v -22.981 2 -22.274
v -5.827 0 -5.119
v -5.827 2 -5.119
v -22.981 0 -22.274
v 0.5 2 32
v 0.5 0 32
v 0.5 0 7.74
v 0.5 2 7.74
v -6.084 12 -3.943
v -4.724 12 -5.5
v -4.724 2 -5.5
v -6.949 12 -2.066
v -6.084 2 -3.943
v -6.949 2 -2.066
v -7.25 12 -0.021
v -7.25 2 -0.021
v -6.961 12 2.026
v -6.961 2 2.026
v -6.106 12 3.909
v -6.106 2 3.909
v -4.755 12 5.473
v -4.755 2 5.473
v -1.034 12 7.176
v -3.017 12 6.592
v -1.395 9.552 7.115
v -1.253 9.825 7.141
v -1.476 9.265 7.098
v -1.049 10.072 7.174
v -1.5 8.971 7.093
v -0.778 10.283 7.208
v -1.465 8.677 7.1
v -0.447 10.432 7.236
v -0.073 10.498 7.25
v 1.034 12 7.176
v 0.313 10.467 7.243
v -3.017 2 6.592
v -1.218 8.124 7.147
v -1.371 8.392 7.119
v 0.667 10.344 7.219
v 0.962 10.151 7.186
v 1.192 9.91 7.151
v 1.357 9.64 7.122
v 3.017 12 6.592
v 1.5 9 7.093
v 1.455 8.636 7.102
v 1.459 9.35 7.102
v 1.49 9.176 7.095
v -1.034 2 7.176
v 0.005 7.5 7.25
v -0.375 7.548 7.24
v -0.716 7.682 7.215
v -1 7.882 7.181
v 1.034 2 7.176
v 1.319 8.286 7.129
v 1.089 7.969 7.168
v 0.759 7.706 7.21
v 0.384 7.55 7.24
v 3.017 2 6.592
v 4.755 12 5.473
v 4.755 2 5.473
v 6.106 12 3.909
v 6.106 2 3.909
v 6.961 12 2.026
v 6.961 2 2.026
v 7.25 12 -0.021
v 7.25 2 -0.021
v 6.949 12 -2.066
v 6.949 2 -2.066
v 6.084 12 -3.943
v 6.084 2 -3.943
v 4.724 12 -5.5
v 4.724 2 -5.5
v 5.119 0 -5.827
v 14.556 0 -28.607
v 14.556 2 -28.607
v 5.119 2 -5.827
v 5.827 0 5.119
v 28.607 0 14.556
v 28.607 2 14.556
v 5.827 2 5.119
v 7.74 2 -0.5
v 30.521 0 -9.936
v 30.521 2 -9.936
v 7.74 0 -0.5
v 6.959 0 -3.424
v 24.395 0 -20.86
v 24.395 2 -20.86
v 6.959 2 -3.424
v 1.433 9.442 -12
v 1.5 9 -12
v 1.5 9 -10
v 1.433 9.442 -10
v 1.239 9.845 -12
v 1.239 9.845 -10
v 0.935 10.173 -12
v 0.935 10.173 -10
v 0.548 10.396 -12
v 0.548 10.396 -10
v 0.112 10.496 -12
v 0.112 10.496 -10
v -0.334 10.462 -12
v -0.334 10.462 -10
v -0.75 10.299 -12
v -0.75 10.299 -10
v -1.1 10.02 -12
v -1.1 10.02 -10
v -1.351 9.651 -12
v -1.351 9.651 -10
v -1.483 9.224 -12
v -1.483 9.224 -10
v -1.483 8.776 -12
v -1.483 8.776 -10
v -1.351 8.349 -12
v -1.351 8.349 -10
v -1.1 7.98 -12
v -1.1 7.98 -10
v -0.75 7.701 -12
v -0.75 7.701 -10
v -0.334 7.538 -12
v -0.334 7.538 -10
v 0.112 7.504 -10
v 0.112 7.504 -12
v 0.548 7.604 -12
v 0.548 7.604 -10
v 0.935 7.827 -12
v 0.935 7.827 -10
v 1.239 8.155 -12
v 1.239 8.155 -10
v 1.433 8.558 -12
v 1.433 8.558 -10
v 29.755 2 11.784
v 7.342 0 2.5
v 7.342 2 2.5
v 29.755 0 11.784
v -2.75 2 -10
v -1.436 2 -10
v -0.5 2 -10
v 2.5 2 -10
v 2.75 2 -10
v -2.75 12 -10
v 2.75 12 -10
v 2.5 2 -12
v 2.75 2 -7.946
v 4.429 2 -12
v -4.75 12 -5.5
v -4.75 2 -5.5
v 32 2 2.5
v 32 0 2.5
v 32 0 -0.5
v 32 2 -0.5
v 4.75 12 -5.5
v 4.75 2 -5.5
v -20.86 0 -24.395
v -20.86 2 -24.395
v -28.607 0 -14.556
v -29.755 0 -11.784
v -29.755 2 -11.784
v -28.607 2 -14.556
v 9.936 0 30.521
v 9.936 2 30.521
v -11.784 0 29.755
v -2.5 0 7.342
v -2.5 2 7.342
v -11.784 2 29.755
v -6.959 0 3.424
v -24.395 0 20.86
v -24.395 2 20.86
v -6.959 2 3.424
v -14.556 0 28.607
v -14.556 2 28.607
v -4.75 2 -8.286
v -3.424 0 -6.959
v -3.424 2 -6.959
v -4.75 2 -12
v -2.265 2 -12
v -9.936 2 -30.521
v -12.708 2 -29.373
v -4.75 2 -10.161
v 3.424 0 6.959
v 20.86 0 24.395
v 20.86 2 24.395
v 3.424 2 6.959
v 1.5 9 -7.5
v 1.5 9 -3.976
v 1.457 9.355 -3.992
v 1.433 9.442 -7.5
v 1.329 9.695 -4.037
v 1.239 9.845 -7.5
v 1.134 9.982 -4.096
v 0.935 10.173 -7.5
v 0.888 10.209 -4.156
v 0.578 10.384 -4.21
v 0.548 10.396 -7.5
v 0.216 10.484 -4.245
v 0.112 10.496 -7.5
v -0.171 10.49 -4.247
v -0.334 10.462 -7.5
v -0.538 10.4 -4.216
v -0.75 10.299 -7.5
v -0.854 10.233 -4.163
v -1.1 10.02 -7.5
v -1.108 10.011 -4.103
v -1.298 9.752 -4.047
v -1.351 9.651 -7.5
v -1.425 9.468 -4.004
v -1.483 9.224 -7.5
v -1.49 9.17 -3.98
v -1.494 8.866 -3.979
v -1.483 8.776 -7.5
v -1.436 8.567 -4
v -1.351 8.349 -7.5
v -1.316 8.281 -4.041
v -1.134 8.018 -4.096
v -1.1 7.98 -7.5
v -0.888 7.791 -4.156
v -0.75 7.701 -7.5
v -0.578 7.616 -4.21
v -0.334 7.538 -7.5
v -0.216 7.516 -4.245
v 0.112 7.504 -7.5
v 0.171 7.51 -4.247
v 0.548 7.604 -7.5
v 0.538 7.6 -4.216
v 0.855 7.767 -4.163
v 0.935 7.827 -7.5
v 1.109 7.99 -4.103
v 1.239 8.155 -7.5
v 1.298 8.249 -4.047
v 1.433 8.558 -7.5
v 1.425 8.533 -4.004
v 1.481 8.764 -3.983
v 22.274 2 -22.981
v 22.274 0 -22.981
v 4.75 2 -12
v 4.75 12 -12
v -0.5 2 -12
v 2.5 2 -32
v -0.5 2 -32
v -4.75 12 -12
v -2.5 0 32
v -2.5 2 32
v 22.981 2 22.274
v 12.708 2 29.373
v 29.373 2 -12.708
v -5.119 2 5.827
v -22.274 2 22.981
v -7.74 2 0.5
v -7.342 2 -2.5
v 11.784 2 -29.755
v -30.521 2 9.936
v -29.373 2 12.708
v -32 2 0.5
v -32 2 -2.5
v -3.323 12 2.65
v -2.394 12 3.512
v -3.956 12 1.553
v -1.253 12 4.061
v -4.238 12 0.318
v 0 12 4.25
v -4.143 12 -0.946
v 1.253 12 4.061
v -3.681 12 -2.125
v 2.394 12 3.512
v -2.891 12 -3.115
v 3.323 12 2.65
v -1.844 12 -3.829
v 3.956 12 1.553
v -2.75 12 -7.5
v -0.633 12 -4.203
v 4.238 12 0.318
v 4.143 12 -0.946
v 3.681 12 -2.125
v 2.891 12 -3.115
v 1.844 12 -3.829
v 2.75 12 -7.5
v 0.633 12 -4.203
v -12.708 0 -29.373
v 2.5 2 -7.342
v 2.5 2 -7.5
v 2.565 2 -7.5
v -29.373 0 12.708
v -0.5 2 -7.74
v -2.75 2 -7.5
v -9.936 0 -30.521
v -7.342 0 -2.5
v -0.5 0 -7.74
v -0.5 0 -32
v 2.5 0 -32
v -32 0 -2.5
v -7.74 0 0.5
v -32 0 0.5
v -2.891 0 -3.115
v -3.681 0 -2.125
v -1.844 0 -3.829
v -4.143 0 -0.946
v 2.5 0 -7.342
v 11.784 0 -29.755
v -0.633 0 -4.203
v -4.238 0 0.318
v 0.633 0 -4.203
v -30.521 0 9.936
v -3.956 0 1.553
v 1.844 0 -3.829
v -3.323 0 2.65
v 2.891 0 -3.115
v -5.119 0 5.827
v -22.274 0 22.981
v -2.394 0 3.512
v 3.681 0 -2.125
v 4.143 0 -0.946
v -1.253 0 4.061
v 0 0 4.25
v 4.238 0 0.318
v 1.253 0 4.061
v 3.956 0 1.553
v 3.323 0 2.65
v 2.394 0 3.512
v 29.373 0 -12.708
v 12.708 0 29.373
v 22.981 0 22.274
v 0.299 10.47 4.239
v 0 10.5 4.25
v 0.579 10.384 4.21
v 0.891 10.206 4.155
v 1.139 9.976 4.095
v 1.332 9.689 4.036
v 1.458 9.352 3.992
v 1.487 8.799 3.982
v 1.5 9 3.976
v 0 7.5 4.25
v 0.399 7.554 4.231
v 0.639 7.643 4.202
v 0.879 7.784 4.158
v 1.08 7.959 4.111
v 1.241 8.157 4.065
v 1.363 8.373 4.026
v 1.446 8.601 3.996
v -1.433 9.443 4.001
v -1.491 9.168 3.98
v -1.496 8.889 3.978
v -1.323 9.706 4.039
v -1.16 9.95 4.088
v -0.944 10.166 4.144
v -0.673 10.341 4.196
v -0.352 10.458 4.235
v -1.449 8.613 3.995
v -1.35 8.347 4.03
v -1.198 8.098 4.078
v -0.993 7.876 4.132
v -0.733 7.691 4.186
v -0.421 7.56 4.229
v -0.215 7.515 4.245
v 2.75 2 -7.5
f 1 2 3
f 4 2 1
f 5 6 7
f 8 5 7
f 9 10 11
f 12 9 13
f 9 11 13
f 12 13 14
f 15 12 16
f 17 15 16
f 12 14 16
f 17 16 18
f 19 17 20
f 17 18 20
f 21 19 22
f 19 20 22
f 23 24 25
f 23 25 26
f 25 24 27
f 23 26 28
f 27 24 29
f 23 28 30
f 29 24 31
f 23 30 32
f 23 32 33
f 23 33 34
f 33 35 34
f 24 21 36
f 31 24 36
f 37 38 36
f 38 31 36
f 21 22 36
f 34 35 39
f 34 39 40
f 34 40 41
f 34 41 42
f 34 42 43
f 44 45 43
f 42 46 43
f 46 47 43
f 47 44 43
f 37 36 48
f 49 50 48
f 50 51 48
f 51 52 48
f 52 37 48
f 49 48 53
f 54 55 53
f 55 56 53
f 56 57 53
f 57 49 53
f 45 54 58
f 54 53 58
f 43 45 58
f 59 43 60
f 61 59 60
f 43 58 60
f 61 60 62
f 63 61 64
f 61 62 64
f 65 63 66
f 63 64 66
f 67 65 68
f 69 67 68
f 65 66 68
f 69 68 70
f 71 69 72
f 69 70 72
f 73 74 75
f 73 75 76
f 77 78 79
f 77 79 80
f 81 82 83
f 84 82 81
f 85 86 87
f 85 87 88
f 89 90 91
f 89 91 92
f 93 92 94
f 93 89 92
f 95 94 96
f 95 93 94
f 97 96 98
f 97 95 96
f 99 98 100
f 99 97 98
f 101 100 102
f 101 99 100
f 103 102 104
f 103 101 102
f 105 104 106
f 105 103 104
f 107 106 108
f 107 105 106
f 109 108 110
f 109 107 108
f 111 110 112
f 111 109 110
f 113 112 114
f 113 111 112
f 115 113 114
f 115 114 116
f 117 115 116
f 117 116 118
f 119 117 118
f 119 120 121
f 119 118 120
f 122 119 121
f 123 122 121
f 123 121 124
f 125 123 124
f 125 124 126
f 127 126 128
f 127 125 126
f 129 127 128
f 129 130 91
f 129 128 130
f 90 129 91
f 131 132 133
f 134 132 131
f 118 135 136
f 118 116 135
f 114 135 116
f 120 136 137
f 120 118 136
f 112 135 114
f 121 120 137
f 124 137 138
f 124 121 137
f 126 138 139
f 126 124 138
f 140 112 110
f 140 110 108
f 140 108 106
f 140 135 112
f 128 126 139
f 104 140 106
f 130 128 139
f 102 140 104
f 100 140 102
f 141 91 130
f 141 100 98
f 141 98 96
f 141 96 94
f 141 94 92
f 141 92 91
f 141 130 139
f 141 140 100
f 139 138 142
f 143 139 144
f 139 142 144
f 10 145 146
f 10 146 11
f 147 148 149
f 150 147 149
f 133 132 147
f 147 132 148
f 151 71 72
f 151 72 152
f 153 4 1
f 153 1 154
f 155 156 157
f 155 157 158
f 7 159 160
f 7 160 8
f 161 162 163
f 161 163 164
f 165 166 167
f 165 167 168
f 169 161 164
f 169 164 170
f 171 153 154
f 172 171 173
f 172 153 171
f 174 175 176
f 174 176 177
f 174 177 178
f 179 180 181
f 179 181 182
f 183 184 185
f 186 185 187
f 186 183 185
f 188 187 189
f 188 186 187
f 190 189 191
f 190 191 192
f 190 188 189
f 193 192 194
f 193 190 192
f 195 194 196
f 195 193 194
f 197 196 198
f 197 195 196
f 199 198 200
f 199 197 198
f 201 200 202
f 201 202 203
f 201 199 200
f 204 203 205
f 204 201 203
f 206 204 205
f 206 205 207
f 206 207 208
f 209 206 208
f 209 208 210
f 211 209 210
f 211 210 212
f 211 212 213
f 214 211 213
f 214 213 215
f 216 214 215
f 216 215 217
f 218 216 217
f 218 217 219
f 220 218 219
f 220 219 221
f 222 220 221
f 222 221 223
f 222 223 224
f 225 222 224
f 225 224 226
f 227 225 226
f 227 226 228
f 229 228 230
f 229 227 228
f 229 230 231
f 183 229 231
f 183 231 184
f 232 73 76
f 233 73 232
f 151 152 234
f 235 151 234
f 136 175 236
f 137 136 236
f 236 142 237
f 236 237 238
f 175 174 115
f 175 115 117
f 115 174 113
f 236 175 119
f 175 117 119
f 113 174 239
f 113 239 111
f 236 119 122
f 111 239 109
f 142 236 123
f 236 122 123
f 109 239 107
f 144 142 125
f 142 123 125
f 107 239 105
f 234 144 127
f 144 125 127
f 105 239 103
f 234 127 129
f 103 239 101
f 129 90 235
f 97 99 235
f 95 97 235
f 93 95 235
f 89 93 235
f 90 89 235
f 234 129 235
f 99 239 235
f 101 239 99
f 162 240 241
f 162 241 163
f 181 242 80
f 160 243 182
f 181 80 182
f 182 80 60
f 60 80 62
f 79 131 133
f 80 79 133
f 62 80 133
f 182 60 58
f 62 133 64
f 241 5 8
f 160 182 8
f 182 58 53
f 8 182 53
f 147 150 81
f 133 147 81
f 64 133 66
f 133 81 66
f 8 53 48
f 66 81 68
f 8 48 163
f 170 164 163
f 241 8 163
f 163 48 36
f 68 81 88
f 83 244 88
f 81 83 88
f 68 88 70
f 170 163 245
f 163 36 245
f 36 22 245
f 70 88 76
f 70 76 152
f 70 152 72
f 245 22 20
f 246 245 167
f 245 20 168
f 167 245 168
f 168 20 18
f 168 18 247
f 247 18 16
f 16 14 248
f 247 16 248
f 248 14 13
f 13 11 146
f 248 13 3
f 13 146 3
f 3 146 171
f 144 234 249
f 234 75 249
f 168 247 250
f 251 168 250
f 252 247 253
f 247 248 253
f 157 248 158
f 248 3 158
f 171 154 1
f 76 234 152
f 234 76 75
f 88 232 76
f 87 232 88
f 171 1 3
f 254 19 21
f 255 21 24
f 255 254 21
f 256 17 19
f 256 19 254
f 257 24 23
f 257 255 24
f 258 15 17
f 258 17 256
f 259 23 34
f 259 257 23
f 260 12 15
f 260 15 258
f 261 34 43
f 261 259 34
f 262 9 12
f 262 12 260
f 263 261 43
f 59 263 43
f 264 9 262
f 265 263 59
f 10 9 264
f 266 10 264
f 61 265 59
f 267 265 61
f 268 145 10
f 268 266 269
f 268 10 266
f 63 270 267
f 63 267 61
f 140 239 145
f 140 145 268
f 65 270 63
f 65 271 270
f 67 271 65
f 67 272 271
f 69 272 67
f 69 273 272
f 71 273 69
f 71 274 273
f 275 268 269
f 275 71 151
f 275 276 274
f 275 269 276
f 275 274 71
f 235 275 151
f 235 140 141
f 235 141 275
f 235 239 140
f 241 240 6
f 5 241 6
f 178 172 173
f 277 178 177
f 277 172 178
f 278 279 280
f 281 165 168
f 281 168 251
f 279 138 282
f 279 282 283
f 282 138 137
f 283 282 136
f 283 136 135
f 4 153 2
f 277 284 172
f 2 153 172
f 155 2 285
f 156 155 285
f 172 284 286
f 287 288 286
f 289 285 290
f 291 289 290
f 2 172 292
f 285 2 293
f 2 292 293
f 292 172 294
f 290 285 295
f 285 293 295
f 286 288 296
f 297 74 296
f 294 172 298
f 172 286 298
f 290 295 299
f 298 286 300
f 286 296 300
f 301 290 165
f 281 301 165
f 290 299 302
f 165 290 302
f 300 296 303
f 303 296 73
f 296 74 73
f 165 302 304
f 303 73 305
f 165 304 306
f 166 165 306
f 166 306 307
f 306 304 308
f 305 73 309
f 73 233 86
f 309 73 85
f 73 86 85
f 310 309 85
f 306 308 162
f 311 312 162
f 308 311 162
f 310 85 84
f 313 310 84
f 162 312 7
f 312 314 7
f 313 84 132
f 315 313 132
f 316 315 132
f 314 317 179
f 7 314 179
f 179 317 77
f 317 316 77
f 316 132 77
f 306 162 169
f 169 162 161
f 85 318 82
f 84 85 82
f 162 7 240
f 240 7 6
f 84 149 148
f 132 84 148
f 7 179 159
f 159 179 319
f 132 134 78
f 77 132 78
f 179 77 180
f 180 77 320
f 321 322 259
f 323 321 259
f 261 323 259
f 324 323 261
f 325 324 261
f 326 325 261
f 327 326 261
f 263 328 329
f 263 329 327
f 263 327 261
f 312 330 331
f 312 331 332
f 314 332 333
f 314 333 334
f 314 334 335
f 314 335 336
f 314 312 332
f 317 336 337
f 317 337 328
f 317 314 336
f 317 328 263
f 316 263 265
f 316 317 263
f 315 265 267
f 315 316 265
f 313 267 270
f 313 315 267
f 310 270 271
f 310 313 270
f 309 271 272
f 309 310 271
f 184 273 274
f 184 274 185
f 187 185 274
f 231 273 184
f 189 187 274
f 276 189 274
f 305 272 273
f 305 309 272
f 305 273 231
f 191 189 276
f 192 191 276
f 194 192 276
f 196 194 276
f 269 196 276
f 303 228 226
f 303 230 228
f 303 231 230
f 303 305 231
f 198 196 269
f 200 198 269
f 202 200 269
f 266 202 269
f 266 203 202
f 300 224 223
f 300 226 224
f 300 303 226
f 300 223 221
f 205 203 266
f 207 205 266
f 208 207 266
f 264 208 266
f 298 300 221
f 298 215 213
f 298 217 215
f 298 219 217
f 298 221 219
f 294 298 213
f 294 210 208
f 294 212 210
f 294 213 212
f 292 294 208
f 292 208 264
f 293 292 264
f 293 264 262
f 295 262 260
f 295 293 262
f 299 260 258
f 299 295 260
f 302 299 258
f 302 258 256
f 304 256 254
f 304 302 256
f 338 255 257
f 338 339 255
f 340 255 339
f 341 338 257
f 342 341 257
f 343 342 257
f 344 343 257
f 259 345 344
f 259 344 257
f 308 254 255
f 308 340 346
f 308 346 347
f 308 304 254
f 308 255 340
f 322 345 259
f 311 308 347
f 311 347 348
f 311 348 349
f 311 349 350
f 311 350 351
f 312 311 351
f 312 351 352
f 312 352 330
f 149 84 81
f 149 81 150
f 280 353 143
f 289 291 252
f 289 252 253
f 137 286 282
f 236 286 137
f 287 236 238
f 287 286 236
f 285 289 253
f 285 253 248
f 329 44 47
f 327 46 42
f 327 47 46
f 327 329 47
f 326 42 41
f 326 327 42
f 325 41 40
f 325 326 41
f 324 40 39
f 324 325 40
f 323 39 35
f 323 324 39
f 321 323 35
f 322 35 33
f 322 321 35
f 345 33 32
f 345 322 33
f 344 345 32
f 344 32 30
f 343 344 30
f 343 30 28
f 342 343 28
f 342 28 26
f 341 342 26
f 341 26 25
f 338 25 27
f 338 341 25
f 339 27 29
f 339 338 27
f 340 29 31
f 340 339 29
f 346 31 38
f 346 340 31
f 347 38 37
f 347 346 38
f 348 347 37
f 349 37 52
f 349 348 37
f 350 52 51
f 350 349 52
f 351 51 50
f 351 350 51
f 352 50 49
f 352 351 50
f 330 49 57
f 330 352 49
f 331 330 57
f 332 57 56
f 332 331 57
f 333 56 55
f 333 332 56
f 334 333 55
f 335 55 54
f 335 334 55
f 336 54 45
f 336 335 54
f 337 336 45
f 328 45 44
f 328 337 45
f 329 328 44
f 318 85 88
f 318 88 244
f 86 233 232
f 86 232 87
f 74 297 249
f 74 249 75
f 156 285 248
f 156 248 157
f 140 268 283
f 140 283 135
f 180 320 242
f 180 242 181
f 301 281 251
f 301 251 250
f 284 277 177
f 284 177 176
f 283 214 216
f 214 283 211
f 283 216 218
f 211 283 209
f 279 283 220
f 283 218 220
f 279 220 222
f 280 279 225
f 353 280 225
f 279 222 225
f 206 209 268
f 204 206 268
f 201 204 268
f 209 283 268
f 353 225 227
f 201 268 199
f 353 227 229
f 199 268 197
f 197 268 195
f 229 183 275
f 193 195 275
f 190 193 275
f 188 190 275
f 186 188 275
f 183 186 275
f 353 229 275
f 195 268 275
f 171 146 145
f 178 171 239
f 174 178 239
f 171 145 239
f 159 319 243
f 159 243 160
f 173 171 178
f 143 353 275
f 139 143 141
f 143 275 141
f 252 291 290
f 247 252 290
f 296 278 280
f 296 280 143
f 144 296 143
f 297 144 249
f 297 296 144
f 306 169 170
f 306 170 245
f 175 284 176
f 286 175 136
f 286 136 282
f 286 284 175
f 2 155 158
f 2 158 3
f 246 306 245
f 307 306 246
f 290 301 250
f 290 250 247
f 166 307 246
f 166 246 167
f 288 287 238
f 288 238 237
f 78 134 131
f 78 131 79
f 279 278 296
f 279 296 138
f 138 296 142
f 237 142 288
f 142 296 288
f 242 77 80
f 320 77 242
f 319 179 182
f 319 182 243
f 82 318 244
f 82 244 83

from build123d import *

# Parameters (mm, degrees)
SKETCH1_R               = 7.25
SKETCH1_R_2             = 4.25
SKETCH1_W               = 3
SKETCH1_H               = 32
SKETCH1_W_2             = 32
SKETCH1_H_2             = 3
BOSS_EXTRUDE1_DEPTH     = 2
SKETCH1_3_R             = 7.25
SKETCH1_3_R_2           = 4.25
BOSS_EXTRUDE2_DEPTH     = 12
SKETCH5_W               = 9.5
SKETCH5_H               = 6.5
SKETCH5_W_2             = 5.5
SKETCH5_H_2             = 2.5
BOSS_EXTRUDE3_DEPTH     = 10
CUT_EXTRUDE1_DEPTH      = 47.818799643
CUT_EXTRUDE1_DEPTH_BACK = 47.818799643
SKETCH2_R               = 1.5
CUT_EXTRUDE3_DEPTH      = 47.818799643
CUT_EXTRUDE3_DEPTH_BACK = 47.818799643
SKETCH3_R               = 4.25


with BuildPart() as part:
    # Sketch1 → Boss-Extrude1 (new body)
    # profile 1 of 17: a face of its own
    with BuildSketch(Plane(origin=(0, 0, 0), x_dir=(1, 0, 0), z_dir=(0, 1, 0))):
        Circle(SKETCH1_R)
        Circle(SKETCH1_R_2, mode=Mode.SUBTRACT)
    # profile 2 of 17: a face of its own
    with BuildSketch(Plane(origin=(0, 0, 0), x_dir=(1, 0, 0), z_dir=(0, 1, 0))):
        Polygon((-0.461939766, 0.191341716), (11.783930069, 29.755486757), (14.555568667, 28.607436459), (2.309698831, -0.956708581), align=None)
    # profile 3 of 17: a face of its own
    with BuildSketch(Plane(origin=(0, 0, 0), x_dir=(1, 0, 0), z_dir=(0, 1, 0))):
        with Locations((1, 16)):
            Rectangle(SKETCH1_W, SKETCH1_H)
    # profile 4 of 17: a face of its own
    with BuildSketch(Plane(origin=(0, 0, 0), x_dir=(1, 0, 0), z_dir=(0, 1, 0))):
        Polygon((-0.353553391, 0.353553391), (22.273863607, 22.980970389), (24.395183951, 20.859650045), (1.767766953, -1.767766953), align=None)
    # profile 5 of 17: a face of its own
    with BuildSketch(Plane(origin=(0, 0, 0), x_dir=(1, 0, 0), z_dir=(0, 1, 0))):
        Polygon((-0.191341716, 0.461939766), (29.372803324, 12.707809602), (30.520853621, 9.936171004), (0.956708581, -2.309698831), align=None)
    # profile 6 of 17: a face of its own
    with BuildSketch(Plane(origin=(0, 0, 0), x_dir=(1, 0, 0), z_dir=(0, 1, 0))):
        with Locations((16, -1)):
            Rectangle(SKETCH1_W_2, SKETCH1_H_2)
    # profile 7 of 17: a face of its own
    with BuildSketch(Plane(origin=(0, 0, 0), x_dir=(1, 0, 0), z_dir=(0, 1, 0))):
        Polygon((0.191341716, 0.461939766), (29.755486757, -11.783930069), (28.607436459, -14.555568667), (-0.956708581, -2.309698831), align=None)
    # profile 8 of 17: a face of its own
    with BuildSketch(Plane(origin=(0, 0, 0), x_dir=(1, 0, 0), z_dir=(0, 1, 0))):
        Polygon((0.353553391, 0.353553391), (22.980970389, -22.273863607), (20.859650045, -24.395183951), (-1.767766953, -1.767766953), align=None)
    # profile 9 of 17: a face of its own
    with BuildSketch(Plane(origin=(0, 0, 0), x_dir=(1, 0, 0), z_dir=(0, 1, 0))):
        Polygon((0.461939766, 0.191341716), (12.707809602, -29.372803324), (9.936171004, -30.520853621), (-2.309698831, -0.956708581), align=None)
    # profile 10 of 17: a face of its own
    with BuildSketch(Plane(origin=(0, 0, 0), x_dir=(1, 0, 0), z_dir=(0, 1, 0))):
        with Locations((-1, -16)):
            Rectangle(SKETCH1_W, SKETCH1_H)
    # profile 11 of 17: a face of its own
    with BuildSketch(Plane(origin=(0, 0, 0), x_dir=(1, 0, 0), z_dir=(0, 1, 0))):
        Polygon((0.461939766, -0.191341716), (-11.783930069, -29.755486757), (-14.555568667, -28.607436459), (-2.309698831, 0.956708581), align=None)
    # profile 12 of 17: a face of its own
    with BuildSketch(Plane(origin=(0, 0, 0), x_dir=(1, 0, 0), z_dir=(0, 1, 0))):
        Polygon((0.353553391, -0.353553391), (-22.273863607, -22.980970389), (-24.395183951, -20.859650045), (-1.767766953, 1.767766953), align=None)
    # profile 13 of 17: a face of its own
    with BuildSketch(Plane(origin=(0, 0, 0), x_dir=(1, 0, 0), z_dir=(0, 1, 0))):
        Polygon((0.191341716, -0.461939766), (-29.372803324, -12.707809602), (-30.520853621, -9.936171004), (-0.956708581, 2.309698831), align=None)
    # profile 14 of 17: a face of its own
    with BuildSketch(Plane(origin=(0, 0, 0), x_dir=(1, 0, 0), z_dir=(0, 1, 0))):
        with Locations((-16, 1)):
            Rectangle(SKETCH1_W_2, SKETCH1_H_2)
    # profile 15 of 17: a face of its own
    with BuildSketch(Plane(origin=(0, 0, 0), x_dir=(1, 0, 0), z_dir=(0, 1, 0))):
        Polygon((-0.191341716, -0.461939766), (-29.755486757, 11.783930069), (-28.607436459, 14.555568667), (0.956708581, 2.309698831), align=None)
    # profile 16 of 17: a face of its own
    with BuildSketch(Plane(origin=(0, 0, 0), x_dir=(1, 0, 0), z_dir=(0, 1, 0))):
        Polygon((-0.353553391, -0.353553391), (-22.980970389, 22.273863607), (-20.859650045, 24.395183951), (1.767766953, 1.767766953), align=None)
    # profile 17 of 17: a face of its own
    with BuildSketch(Plane(origin=(0, 0, 0), x_dir=(1, 0, 0), z_dir=(0, 1, 0))):
        Polygon((-0.461939766, -0.191341716), (-12.707809602, 29.372803324), (-9.936171004, 30.520853621), (2.309698831, 0.956708581), align=None)
    extrude(amount=BOSS_EXTRUDE1_DEPTH)

    # Sketch1<3> → Boss-Extrude2 (add)
    with BuildSketch(Plane(origin=(0, 0, 0), x_dir=(1, 0, 0), z_dir=(0, 1, 0))):
        Circle(SKETCH1_3_R)
        Circle(SKETCH1_3_R_2, mode=Mode.SUBTRACT)
    extrude(amount=BOSS_EXTRUDE2_DEPTH)

    # Sketch5 → Boss-Extrude3 (add)
    with BuildSketch(Plane(origin=(0, 12, 0), x_dir=(1, 0, 0), z_dir=(0, 1, 0))):
        with Locations((0, 8.75)):
            Rectangle(SKETCH5_W, SKETCH5_H)
        with Locations((0, 8.75)):
            Rectangle(SKETCH5_W_2, SKETCH5_H_2, mode=Mode.SUBTRACT)
    extrude(amount=-BOSS_EXTRUDE3_DEPTH)

    # Sketch2 → Cut-Extrude1 (cut, two sides: drawn at the far end of the back side and taken through both)
    with BuildSketch(Plane.XY.offset(-CUT_EXTRUDE1_DEPTH_BACK)):
        with Locations((0, 9)):
            Circle(SKETCH2_R)
    extrude(amount=CUT_EXTRUDE1_DEPTH + CUT_EXTRUDE1_DEPTH_BACK, mode=Mode.SUBTRACT)

    # Sketch3 → Cut-Extrude3 (cut, two sides: drawn at the far end of the back side and taken through both)
    with BuildSketch(Plane(origin=(0, 12, 0), x_dir=(1, 0, 0), z_dir=(0, 1, 0)).offset(-CUT_EXTRUDE3_DEPTH_BACK)):
        Circle(SKETCH3_R)
    extrude(amount=CUT_EXTRUDE3_DEPTH + CUT_EXTRUDE3_DEPTH_BACK, mode=Mode.SUBTRACT)


solid = part.part
